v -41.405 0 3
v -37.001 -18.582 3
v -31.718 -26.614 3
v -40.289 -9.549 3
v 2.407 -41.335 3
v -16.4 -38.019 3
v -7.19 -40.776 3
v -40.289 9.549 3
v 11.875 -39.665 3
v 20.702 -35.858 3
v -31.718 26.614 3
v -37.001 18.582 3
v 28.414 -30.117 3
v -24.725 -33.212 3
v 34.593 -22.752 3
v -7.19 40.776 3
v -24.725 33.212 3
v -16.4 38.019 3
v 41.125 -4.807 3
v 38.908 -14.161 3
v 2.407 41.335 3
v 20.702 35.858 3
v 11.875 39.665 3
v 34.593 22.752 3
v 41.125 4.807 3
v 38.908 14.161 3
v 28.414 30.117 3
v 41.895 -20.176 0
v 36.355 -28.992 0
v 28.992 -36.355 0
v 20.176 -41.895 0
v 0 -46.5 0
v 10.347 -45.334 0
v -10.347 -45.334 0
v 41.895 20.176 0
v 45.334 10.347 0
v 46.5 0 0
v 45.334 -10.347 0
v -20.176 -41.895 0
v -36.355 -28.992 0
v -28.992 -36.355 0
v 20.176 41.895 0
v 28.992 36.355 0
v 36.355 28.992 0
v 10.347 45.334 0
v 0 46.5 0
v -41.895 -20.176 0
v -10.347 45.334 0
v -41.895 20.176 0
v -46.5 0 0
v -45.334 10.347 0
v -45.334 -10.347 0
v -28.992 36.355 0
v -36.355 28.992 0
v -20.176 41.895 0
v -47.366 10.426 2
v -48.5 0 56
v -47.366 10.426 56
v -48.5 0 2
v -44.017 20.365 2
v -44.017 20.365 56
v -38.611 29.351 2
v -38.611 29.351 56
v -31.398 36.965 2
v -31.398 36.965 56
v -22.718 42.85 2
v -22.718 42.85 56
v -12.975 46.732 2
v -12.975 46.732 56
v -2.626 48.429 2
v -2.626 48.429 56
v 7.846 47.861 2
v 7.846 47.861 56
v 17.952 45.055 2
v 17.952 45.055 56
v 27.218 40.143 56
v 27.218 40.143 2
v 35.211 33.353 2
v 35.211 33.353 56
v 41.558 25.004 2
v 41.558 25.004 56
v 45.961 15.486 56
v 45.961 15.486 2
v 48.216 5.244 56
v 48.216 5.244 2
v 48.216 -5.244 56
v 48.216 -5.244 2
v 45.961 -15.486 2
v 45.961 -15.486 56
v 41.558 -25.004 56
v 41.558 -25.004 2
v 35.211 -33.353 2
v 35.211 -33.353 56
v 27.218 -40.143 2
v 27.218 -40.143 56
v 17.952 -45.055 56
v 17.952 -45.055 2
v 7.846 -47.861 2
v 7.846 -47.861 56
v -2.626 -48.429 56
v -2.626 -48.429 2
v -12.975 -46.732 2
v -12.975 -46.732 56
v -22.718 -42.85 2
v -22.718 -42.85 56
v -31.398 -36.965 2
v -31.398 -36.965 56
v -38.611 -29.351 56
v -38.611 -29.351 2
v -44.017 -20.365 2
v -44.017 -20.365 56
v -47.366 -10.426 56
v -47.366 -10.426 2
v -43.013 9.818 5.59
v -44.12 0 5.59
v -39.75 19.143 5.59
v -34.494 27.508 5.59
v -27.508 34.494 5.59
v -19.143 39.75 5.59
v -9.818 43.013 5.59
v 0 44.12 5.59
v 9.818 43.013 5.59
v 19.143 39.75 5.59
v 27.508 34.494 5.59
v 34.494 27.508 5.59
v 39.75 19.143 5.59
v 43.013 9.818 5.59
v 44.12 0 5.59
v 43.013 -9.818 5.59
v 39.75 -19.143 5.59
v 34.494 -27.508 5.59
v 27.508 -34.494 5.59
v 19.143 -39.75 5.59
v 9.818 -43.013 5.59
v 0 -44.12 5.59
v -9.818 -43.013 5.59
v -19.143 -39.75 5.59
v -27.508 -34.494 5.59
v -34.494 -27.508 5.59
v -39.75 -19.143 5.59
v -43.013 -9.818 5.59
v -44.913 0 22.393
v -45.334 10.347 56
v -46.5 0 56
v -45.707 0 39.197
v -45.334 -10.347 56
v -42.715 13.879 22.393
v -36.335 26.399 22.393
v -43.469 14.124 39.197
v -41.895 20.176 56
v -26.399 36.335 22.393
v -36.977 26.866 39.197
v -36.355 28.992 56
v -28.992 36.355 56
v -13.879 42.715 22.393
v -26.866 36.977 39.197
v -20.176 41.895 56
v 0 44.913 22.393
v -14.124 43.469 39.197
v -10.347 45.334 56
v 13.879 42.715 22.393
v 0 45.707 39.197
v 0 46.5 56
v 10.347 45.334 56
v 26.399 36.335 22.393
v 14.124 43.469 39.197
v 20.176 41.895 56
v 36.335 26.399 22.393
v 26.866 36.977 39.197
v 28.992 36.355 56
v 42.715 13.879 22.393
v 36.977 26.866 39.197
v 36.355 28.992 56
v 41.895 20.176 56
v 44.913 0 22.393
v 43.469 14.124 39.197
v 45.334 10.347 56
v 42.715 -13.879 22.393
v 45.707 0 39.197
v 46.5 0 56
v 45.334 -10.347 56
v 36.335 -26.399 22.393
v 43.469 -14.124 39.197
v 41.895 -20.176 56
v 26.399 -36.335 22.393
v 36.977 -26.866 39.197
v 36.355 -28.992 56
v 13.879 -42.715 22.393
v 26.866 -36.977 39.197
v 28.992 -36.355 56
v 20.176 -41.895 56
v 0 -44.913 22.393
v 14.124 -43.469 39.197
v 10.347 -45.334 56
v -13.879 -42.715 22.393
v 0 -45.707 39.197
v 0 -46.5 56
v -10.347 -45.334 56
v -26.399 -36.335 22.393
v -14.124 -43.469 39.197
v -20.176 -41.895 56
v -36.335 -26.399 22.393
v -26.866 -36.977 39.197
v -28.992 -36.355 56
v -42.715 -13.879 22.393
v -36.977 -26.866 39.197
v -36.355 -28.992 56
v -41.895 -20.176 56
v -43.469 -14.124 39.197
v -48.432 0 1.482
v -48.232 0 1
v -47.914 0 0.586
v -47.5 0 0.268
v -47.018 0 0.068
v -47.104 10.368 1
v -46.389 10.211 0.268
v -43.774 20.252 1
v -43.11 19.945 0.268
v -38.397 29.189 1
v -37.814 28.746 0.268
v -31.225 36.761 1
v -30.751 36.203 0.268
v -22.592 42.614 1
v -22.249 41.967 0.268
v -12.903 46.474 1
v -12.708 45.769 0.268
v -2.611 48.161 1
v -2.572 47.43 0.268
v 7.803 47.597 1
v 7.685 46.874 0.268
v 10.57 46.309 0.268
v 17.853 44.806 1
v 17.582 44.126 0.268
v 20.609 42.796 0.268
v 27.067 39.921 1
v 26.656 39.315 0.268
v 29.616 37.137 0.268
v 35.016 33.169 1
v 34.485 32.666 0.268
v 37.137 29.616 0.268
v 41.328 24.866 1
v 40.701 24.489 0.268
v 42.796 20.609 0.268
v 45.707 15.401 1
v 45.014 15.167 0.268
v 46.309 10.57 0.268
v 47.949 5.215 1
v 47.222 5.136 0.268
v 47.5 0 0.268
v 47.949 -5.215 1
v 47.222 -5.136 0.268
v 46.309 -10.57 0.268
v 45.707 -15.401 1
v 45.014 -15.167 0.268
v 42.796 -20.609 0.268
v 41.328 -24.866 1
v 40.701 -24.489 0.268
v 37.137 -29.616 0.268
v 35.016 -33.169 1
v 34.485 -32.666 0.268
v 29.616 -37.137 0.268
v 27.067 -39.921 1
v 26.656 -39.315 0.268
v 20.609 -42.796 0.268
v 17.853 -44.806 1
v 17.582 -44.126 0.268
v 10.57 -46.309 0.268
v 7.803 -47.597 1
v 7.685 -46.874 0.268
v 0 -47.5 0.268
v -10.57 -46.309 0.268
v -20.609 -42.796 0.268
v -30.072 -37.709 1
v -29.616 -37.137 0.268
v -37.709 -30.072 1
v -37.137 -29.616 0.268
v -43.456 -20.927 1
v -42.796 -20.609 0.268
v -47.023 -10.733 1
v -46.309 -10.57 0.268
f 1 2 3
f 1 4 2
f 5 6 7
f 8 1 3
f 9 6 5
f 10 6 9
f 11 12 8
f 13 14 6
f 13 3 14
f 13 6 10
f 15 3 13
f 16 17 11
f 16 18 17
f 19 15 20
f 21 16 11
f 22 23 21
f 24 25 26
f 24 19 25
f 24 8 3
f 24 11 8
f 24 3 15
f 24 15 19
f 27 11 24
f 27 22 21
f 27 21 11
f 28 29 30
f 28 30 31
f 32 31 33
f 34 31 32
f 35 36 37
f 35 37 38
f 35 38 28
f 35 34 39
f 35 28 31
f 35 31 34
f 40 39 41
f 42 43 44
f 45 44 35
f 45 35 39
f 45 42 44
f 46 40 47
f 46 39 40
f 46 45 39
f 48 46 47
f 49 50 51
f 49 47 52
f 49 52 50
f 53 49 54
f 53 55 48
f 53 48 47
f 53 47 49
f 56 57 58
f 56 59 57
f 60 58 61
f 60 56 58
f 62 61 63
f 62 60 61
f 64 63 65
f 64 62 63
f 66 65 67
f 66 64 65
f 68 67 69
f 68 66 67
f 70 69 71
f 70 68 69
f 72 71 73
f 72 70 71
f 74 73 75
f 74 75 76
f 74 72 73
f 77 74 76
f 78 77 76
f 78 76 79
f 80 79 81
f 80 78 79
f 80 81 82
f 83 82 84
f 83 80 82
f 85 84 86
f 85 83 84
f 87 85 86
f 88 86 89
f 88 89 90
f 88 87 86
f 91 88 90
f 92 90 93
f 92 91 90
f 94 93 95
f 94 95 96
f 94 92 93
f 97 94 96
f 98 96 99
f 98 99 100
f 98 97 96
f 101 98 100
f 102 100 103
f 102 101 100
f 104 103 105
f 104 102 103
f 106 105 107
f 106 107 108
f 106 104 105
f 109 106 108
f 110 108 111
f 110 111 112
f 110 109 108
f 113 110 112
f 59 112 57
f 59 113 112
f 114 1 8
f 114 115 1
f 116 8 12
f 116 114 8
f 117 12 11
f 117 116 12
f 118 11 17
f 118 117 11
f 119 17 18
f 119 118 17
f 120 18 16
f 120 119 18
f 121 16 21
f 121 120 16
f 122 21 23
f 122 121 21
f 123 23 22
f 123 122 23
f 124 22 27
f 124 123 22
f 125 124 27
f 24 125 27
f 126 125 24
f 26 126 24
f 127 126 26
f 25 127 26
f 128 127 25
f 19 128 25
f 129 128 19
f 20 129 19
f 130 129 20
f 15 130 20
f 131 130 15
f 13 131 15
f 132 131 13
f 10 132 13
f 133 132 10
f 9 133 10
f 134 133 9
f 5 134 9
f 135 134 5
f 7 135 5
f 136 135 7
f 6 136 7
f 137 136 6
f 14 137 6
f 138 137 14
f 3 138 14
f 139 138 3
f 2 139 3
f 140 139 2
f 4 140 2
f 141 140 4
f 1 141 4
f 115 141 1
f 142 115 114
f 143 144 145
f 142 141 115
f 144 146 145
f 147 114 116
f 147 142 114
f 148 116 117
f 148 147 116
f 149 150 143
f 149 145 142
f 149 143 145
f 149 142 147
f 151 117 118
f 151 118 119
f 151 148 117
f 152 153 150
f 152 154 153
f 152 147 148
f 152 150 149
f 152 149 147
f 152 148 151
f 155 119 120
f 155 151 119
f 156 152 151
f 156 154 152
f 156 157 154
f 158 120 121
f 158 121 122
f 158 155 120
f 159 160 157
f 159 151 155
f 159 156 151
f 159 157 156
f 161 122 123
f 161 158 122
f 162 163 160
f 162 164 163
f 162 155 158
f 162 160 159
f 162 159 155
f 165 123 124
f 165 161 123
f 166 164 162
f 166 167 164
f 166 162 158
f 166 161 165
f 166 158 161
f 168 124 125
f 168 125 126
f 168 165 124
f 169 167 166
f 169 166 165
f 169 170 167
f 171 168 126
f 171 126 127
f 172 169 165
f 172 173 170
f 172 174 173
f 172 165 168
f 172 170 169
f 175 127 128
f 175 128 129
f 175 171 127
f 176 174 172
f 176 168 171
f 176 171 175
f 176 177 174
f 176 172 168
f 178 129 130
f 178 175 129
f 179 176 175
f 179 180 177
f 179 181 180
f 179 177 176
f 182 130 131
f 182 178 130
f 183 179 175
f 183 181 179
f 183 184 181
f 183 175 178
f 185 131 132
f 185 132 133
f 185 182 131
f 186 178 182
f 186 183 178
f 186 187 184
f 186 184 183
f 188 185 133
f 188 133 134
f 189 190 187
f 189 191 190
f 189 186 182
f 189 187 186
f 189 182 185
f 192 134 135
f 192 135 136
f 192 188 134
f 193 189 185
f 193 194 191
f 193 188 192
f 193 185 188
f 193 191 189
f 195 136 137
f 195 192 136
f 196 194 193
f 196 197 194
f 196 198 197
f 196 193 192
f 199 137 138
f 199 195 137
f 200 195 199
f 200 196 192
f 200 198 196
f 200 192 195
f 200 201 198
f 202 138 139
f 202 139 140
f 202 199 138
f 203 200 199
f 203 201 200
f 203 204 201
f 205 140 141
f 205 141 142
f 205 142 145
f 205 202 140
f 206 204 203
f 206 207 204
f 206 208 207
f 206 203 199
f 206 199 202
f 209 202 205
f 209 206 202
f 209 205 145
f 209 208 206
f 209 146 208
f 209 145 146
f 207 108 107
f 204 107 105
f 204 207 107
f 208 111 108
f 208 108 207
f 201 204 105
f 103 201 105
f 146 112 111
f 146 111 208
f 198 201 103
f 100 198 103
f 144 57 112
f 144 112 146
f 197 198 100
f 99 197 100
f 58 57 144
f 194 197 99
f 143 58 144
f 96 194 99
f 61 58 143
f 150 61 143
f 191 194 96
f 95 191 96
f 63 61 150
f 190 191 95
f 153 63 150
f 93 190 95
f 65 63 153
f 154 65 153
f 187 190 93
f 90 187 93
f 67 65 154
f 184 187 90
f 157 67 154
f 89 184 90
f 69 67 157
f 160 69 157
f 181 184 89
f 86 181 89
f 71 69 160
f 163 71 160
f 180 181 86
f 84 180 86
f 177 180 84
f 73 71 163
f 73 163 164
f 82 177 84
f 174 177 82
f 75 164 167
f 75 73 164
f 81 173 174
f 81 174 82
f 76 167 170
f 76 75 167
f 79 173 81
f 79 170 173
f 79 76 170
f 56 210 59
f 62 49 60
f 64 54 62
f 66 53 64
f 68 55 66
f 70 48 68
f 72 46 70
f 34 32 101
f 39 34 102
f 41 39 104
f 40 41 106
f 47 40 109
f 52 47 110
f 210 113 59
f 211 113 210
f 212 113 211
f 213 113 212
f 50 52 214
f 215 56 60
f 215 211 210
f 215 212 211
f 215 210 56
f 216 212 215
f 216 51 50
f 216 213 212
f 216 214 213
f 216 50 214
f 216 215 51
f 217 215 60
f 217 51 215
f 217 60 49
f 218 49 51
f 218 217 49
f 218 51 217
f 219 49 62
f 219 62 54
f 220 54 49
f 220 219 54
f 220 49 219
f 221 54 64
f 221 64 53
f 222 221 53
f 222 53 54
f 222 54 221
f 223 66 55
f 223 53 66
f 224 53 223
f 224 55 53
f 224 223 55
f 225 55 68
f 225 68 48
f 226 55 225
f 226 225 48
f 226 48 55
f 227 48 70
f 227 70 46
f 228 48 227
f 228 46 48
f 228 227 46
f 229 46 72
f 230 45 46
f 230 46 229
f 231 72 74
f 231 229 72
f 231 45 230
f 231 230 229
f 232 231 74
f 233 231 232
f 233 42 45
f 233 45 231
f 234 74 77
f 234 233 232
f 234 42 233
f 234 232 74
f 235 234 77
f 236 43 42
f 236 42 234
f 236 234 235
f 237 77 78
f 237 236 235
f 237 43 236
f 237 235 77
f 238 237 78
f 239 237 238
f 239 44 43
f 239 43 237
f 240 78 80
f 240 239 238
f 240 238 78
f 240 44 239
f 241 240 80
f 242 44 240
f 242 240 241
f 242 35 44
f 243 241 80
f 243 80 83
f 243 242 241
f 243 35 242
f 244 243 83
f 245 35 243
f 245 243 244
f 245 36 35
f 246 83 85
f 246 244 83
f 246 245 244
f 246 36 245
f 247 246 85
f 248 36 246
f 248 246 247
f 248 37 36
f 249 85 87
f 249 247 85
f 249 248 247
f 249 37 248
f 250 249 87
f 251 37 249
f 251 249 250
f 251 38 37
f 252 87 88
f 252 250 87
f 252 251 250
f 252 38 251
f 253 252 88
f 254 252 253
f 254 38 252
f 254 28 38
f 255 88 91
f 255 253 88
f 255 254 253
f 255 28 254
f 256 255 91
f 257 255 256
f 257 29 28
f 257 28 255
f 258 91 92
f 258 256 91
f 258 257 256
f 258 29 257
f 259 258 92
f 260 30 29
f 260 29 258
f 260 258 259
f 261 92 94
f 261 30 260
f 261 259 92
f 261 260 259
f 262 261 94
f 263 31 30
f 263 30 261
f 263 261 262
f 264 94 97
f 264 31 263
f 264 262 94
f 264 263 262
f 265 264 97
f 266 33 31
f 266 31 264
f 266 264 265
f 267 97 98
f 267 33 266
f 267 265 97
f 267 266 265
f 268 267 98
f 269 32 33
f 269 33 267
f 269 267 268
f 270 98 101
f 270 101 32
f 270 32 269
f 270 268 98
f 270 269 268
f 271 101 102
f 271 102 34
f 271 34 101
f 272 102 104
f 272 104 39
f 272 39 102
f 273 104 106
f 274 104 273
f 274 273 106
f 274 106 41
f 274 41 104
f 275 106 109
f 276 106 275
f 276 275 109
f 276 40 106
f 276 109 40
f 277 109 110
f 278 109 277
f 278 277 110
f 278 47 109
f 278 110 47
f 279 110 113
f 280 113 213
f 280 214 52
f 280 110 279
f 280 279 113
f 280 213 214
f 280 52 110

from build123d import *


with BuildPart() as f1:
    # F0 (on Front) → F1 (revolve)
    with BuildSketch(Plane.XZ):
        Polygon((-44, 3), (-41.404769, 3), (-44.119512, 5.589822), (-44, 3.058995), align=None)
        with BuildLine():
            Line((-46.5, 0), (0, 0))
            Line((0, 0), (0, 3))
            Line((0, 3), (-41.404769, 3))
            Line((-41.404769, 3), (-44, 3))
            Line((-44, 3), (-44, 3.058995))
            Line((-44, 3.058995), (-44.119512, 5.589822))
            Line((-44.119512, 5.589822), (-46.5, 56))
            Line((-46.5, 56), (-48.5, 56))
            Line((-48.5, 56), (-48.5, 2))
            ThreePointArc((-48.5, 2), (-47.914214, 0.585786), (-46.5, 0))
        make_face()
    revolve(axis=Axis((0, 0, 1.5), (0, 0, -1)))


solid = f1.part
